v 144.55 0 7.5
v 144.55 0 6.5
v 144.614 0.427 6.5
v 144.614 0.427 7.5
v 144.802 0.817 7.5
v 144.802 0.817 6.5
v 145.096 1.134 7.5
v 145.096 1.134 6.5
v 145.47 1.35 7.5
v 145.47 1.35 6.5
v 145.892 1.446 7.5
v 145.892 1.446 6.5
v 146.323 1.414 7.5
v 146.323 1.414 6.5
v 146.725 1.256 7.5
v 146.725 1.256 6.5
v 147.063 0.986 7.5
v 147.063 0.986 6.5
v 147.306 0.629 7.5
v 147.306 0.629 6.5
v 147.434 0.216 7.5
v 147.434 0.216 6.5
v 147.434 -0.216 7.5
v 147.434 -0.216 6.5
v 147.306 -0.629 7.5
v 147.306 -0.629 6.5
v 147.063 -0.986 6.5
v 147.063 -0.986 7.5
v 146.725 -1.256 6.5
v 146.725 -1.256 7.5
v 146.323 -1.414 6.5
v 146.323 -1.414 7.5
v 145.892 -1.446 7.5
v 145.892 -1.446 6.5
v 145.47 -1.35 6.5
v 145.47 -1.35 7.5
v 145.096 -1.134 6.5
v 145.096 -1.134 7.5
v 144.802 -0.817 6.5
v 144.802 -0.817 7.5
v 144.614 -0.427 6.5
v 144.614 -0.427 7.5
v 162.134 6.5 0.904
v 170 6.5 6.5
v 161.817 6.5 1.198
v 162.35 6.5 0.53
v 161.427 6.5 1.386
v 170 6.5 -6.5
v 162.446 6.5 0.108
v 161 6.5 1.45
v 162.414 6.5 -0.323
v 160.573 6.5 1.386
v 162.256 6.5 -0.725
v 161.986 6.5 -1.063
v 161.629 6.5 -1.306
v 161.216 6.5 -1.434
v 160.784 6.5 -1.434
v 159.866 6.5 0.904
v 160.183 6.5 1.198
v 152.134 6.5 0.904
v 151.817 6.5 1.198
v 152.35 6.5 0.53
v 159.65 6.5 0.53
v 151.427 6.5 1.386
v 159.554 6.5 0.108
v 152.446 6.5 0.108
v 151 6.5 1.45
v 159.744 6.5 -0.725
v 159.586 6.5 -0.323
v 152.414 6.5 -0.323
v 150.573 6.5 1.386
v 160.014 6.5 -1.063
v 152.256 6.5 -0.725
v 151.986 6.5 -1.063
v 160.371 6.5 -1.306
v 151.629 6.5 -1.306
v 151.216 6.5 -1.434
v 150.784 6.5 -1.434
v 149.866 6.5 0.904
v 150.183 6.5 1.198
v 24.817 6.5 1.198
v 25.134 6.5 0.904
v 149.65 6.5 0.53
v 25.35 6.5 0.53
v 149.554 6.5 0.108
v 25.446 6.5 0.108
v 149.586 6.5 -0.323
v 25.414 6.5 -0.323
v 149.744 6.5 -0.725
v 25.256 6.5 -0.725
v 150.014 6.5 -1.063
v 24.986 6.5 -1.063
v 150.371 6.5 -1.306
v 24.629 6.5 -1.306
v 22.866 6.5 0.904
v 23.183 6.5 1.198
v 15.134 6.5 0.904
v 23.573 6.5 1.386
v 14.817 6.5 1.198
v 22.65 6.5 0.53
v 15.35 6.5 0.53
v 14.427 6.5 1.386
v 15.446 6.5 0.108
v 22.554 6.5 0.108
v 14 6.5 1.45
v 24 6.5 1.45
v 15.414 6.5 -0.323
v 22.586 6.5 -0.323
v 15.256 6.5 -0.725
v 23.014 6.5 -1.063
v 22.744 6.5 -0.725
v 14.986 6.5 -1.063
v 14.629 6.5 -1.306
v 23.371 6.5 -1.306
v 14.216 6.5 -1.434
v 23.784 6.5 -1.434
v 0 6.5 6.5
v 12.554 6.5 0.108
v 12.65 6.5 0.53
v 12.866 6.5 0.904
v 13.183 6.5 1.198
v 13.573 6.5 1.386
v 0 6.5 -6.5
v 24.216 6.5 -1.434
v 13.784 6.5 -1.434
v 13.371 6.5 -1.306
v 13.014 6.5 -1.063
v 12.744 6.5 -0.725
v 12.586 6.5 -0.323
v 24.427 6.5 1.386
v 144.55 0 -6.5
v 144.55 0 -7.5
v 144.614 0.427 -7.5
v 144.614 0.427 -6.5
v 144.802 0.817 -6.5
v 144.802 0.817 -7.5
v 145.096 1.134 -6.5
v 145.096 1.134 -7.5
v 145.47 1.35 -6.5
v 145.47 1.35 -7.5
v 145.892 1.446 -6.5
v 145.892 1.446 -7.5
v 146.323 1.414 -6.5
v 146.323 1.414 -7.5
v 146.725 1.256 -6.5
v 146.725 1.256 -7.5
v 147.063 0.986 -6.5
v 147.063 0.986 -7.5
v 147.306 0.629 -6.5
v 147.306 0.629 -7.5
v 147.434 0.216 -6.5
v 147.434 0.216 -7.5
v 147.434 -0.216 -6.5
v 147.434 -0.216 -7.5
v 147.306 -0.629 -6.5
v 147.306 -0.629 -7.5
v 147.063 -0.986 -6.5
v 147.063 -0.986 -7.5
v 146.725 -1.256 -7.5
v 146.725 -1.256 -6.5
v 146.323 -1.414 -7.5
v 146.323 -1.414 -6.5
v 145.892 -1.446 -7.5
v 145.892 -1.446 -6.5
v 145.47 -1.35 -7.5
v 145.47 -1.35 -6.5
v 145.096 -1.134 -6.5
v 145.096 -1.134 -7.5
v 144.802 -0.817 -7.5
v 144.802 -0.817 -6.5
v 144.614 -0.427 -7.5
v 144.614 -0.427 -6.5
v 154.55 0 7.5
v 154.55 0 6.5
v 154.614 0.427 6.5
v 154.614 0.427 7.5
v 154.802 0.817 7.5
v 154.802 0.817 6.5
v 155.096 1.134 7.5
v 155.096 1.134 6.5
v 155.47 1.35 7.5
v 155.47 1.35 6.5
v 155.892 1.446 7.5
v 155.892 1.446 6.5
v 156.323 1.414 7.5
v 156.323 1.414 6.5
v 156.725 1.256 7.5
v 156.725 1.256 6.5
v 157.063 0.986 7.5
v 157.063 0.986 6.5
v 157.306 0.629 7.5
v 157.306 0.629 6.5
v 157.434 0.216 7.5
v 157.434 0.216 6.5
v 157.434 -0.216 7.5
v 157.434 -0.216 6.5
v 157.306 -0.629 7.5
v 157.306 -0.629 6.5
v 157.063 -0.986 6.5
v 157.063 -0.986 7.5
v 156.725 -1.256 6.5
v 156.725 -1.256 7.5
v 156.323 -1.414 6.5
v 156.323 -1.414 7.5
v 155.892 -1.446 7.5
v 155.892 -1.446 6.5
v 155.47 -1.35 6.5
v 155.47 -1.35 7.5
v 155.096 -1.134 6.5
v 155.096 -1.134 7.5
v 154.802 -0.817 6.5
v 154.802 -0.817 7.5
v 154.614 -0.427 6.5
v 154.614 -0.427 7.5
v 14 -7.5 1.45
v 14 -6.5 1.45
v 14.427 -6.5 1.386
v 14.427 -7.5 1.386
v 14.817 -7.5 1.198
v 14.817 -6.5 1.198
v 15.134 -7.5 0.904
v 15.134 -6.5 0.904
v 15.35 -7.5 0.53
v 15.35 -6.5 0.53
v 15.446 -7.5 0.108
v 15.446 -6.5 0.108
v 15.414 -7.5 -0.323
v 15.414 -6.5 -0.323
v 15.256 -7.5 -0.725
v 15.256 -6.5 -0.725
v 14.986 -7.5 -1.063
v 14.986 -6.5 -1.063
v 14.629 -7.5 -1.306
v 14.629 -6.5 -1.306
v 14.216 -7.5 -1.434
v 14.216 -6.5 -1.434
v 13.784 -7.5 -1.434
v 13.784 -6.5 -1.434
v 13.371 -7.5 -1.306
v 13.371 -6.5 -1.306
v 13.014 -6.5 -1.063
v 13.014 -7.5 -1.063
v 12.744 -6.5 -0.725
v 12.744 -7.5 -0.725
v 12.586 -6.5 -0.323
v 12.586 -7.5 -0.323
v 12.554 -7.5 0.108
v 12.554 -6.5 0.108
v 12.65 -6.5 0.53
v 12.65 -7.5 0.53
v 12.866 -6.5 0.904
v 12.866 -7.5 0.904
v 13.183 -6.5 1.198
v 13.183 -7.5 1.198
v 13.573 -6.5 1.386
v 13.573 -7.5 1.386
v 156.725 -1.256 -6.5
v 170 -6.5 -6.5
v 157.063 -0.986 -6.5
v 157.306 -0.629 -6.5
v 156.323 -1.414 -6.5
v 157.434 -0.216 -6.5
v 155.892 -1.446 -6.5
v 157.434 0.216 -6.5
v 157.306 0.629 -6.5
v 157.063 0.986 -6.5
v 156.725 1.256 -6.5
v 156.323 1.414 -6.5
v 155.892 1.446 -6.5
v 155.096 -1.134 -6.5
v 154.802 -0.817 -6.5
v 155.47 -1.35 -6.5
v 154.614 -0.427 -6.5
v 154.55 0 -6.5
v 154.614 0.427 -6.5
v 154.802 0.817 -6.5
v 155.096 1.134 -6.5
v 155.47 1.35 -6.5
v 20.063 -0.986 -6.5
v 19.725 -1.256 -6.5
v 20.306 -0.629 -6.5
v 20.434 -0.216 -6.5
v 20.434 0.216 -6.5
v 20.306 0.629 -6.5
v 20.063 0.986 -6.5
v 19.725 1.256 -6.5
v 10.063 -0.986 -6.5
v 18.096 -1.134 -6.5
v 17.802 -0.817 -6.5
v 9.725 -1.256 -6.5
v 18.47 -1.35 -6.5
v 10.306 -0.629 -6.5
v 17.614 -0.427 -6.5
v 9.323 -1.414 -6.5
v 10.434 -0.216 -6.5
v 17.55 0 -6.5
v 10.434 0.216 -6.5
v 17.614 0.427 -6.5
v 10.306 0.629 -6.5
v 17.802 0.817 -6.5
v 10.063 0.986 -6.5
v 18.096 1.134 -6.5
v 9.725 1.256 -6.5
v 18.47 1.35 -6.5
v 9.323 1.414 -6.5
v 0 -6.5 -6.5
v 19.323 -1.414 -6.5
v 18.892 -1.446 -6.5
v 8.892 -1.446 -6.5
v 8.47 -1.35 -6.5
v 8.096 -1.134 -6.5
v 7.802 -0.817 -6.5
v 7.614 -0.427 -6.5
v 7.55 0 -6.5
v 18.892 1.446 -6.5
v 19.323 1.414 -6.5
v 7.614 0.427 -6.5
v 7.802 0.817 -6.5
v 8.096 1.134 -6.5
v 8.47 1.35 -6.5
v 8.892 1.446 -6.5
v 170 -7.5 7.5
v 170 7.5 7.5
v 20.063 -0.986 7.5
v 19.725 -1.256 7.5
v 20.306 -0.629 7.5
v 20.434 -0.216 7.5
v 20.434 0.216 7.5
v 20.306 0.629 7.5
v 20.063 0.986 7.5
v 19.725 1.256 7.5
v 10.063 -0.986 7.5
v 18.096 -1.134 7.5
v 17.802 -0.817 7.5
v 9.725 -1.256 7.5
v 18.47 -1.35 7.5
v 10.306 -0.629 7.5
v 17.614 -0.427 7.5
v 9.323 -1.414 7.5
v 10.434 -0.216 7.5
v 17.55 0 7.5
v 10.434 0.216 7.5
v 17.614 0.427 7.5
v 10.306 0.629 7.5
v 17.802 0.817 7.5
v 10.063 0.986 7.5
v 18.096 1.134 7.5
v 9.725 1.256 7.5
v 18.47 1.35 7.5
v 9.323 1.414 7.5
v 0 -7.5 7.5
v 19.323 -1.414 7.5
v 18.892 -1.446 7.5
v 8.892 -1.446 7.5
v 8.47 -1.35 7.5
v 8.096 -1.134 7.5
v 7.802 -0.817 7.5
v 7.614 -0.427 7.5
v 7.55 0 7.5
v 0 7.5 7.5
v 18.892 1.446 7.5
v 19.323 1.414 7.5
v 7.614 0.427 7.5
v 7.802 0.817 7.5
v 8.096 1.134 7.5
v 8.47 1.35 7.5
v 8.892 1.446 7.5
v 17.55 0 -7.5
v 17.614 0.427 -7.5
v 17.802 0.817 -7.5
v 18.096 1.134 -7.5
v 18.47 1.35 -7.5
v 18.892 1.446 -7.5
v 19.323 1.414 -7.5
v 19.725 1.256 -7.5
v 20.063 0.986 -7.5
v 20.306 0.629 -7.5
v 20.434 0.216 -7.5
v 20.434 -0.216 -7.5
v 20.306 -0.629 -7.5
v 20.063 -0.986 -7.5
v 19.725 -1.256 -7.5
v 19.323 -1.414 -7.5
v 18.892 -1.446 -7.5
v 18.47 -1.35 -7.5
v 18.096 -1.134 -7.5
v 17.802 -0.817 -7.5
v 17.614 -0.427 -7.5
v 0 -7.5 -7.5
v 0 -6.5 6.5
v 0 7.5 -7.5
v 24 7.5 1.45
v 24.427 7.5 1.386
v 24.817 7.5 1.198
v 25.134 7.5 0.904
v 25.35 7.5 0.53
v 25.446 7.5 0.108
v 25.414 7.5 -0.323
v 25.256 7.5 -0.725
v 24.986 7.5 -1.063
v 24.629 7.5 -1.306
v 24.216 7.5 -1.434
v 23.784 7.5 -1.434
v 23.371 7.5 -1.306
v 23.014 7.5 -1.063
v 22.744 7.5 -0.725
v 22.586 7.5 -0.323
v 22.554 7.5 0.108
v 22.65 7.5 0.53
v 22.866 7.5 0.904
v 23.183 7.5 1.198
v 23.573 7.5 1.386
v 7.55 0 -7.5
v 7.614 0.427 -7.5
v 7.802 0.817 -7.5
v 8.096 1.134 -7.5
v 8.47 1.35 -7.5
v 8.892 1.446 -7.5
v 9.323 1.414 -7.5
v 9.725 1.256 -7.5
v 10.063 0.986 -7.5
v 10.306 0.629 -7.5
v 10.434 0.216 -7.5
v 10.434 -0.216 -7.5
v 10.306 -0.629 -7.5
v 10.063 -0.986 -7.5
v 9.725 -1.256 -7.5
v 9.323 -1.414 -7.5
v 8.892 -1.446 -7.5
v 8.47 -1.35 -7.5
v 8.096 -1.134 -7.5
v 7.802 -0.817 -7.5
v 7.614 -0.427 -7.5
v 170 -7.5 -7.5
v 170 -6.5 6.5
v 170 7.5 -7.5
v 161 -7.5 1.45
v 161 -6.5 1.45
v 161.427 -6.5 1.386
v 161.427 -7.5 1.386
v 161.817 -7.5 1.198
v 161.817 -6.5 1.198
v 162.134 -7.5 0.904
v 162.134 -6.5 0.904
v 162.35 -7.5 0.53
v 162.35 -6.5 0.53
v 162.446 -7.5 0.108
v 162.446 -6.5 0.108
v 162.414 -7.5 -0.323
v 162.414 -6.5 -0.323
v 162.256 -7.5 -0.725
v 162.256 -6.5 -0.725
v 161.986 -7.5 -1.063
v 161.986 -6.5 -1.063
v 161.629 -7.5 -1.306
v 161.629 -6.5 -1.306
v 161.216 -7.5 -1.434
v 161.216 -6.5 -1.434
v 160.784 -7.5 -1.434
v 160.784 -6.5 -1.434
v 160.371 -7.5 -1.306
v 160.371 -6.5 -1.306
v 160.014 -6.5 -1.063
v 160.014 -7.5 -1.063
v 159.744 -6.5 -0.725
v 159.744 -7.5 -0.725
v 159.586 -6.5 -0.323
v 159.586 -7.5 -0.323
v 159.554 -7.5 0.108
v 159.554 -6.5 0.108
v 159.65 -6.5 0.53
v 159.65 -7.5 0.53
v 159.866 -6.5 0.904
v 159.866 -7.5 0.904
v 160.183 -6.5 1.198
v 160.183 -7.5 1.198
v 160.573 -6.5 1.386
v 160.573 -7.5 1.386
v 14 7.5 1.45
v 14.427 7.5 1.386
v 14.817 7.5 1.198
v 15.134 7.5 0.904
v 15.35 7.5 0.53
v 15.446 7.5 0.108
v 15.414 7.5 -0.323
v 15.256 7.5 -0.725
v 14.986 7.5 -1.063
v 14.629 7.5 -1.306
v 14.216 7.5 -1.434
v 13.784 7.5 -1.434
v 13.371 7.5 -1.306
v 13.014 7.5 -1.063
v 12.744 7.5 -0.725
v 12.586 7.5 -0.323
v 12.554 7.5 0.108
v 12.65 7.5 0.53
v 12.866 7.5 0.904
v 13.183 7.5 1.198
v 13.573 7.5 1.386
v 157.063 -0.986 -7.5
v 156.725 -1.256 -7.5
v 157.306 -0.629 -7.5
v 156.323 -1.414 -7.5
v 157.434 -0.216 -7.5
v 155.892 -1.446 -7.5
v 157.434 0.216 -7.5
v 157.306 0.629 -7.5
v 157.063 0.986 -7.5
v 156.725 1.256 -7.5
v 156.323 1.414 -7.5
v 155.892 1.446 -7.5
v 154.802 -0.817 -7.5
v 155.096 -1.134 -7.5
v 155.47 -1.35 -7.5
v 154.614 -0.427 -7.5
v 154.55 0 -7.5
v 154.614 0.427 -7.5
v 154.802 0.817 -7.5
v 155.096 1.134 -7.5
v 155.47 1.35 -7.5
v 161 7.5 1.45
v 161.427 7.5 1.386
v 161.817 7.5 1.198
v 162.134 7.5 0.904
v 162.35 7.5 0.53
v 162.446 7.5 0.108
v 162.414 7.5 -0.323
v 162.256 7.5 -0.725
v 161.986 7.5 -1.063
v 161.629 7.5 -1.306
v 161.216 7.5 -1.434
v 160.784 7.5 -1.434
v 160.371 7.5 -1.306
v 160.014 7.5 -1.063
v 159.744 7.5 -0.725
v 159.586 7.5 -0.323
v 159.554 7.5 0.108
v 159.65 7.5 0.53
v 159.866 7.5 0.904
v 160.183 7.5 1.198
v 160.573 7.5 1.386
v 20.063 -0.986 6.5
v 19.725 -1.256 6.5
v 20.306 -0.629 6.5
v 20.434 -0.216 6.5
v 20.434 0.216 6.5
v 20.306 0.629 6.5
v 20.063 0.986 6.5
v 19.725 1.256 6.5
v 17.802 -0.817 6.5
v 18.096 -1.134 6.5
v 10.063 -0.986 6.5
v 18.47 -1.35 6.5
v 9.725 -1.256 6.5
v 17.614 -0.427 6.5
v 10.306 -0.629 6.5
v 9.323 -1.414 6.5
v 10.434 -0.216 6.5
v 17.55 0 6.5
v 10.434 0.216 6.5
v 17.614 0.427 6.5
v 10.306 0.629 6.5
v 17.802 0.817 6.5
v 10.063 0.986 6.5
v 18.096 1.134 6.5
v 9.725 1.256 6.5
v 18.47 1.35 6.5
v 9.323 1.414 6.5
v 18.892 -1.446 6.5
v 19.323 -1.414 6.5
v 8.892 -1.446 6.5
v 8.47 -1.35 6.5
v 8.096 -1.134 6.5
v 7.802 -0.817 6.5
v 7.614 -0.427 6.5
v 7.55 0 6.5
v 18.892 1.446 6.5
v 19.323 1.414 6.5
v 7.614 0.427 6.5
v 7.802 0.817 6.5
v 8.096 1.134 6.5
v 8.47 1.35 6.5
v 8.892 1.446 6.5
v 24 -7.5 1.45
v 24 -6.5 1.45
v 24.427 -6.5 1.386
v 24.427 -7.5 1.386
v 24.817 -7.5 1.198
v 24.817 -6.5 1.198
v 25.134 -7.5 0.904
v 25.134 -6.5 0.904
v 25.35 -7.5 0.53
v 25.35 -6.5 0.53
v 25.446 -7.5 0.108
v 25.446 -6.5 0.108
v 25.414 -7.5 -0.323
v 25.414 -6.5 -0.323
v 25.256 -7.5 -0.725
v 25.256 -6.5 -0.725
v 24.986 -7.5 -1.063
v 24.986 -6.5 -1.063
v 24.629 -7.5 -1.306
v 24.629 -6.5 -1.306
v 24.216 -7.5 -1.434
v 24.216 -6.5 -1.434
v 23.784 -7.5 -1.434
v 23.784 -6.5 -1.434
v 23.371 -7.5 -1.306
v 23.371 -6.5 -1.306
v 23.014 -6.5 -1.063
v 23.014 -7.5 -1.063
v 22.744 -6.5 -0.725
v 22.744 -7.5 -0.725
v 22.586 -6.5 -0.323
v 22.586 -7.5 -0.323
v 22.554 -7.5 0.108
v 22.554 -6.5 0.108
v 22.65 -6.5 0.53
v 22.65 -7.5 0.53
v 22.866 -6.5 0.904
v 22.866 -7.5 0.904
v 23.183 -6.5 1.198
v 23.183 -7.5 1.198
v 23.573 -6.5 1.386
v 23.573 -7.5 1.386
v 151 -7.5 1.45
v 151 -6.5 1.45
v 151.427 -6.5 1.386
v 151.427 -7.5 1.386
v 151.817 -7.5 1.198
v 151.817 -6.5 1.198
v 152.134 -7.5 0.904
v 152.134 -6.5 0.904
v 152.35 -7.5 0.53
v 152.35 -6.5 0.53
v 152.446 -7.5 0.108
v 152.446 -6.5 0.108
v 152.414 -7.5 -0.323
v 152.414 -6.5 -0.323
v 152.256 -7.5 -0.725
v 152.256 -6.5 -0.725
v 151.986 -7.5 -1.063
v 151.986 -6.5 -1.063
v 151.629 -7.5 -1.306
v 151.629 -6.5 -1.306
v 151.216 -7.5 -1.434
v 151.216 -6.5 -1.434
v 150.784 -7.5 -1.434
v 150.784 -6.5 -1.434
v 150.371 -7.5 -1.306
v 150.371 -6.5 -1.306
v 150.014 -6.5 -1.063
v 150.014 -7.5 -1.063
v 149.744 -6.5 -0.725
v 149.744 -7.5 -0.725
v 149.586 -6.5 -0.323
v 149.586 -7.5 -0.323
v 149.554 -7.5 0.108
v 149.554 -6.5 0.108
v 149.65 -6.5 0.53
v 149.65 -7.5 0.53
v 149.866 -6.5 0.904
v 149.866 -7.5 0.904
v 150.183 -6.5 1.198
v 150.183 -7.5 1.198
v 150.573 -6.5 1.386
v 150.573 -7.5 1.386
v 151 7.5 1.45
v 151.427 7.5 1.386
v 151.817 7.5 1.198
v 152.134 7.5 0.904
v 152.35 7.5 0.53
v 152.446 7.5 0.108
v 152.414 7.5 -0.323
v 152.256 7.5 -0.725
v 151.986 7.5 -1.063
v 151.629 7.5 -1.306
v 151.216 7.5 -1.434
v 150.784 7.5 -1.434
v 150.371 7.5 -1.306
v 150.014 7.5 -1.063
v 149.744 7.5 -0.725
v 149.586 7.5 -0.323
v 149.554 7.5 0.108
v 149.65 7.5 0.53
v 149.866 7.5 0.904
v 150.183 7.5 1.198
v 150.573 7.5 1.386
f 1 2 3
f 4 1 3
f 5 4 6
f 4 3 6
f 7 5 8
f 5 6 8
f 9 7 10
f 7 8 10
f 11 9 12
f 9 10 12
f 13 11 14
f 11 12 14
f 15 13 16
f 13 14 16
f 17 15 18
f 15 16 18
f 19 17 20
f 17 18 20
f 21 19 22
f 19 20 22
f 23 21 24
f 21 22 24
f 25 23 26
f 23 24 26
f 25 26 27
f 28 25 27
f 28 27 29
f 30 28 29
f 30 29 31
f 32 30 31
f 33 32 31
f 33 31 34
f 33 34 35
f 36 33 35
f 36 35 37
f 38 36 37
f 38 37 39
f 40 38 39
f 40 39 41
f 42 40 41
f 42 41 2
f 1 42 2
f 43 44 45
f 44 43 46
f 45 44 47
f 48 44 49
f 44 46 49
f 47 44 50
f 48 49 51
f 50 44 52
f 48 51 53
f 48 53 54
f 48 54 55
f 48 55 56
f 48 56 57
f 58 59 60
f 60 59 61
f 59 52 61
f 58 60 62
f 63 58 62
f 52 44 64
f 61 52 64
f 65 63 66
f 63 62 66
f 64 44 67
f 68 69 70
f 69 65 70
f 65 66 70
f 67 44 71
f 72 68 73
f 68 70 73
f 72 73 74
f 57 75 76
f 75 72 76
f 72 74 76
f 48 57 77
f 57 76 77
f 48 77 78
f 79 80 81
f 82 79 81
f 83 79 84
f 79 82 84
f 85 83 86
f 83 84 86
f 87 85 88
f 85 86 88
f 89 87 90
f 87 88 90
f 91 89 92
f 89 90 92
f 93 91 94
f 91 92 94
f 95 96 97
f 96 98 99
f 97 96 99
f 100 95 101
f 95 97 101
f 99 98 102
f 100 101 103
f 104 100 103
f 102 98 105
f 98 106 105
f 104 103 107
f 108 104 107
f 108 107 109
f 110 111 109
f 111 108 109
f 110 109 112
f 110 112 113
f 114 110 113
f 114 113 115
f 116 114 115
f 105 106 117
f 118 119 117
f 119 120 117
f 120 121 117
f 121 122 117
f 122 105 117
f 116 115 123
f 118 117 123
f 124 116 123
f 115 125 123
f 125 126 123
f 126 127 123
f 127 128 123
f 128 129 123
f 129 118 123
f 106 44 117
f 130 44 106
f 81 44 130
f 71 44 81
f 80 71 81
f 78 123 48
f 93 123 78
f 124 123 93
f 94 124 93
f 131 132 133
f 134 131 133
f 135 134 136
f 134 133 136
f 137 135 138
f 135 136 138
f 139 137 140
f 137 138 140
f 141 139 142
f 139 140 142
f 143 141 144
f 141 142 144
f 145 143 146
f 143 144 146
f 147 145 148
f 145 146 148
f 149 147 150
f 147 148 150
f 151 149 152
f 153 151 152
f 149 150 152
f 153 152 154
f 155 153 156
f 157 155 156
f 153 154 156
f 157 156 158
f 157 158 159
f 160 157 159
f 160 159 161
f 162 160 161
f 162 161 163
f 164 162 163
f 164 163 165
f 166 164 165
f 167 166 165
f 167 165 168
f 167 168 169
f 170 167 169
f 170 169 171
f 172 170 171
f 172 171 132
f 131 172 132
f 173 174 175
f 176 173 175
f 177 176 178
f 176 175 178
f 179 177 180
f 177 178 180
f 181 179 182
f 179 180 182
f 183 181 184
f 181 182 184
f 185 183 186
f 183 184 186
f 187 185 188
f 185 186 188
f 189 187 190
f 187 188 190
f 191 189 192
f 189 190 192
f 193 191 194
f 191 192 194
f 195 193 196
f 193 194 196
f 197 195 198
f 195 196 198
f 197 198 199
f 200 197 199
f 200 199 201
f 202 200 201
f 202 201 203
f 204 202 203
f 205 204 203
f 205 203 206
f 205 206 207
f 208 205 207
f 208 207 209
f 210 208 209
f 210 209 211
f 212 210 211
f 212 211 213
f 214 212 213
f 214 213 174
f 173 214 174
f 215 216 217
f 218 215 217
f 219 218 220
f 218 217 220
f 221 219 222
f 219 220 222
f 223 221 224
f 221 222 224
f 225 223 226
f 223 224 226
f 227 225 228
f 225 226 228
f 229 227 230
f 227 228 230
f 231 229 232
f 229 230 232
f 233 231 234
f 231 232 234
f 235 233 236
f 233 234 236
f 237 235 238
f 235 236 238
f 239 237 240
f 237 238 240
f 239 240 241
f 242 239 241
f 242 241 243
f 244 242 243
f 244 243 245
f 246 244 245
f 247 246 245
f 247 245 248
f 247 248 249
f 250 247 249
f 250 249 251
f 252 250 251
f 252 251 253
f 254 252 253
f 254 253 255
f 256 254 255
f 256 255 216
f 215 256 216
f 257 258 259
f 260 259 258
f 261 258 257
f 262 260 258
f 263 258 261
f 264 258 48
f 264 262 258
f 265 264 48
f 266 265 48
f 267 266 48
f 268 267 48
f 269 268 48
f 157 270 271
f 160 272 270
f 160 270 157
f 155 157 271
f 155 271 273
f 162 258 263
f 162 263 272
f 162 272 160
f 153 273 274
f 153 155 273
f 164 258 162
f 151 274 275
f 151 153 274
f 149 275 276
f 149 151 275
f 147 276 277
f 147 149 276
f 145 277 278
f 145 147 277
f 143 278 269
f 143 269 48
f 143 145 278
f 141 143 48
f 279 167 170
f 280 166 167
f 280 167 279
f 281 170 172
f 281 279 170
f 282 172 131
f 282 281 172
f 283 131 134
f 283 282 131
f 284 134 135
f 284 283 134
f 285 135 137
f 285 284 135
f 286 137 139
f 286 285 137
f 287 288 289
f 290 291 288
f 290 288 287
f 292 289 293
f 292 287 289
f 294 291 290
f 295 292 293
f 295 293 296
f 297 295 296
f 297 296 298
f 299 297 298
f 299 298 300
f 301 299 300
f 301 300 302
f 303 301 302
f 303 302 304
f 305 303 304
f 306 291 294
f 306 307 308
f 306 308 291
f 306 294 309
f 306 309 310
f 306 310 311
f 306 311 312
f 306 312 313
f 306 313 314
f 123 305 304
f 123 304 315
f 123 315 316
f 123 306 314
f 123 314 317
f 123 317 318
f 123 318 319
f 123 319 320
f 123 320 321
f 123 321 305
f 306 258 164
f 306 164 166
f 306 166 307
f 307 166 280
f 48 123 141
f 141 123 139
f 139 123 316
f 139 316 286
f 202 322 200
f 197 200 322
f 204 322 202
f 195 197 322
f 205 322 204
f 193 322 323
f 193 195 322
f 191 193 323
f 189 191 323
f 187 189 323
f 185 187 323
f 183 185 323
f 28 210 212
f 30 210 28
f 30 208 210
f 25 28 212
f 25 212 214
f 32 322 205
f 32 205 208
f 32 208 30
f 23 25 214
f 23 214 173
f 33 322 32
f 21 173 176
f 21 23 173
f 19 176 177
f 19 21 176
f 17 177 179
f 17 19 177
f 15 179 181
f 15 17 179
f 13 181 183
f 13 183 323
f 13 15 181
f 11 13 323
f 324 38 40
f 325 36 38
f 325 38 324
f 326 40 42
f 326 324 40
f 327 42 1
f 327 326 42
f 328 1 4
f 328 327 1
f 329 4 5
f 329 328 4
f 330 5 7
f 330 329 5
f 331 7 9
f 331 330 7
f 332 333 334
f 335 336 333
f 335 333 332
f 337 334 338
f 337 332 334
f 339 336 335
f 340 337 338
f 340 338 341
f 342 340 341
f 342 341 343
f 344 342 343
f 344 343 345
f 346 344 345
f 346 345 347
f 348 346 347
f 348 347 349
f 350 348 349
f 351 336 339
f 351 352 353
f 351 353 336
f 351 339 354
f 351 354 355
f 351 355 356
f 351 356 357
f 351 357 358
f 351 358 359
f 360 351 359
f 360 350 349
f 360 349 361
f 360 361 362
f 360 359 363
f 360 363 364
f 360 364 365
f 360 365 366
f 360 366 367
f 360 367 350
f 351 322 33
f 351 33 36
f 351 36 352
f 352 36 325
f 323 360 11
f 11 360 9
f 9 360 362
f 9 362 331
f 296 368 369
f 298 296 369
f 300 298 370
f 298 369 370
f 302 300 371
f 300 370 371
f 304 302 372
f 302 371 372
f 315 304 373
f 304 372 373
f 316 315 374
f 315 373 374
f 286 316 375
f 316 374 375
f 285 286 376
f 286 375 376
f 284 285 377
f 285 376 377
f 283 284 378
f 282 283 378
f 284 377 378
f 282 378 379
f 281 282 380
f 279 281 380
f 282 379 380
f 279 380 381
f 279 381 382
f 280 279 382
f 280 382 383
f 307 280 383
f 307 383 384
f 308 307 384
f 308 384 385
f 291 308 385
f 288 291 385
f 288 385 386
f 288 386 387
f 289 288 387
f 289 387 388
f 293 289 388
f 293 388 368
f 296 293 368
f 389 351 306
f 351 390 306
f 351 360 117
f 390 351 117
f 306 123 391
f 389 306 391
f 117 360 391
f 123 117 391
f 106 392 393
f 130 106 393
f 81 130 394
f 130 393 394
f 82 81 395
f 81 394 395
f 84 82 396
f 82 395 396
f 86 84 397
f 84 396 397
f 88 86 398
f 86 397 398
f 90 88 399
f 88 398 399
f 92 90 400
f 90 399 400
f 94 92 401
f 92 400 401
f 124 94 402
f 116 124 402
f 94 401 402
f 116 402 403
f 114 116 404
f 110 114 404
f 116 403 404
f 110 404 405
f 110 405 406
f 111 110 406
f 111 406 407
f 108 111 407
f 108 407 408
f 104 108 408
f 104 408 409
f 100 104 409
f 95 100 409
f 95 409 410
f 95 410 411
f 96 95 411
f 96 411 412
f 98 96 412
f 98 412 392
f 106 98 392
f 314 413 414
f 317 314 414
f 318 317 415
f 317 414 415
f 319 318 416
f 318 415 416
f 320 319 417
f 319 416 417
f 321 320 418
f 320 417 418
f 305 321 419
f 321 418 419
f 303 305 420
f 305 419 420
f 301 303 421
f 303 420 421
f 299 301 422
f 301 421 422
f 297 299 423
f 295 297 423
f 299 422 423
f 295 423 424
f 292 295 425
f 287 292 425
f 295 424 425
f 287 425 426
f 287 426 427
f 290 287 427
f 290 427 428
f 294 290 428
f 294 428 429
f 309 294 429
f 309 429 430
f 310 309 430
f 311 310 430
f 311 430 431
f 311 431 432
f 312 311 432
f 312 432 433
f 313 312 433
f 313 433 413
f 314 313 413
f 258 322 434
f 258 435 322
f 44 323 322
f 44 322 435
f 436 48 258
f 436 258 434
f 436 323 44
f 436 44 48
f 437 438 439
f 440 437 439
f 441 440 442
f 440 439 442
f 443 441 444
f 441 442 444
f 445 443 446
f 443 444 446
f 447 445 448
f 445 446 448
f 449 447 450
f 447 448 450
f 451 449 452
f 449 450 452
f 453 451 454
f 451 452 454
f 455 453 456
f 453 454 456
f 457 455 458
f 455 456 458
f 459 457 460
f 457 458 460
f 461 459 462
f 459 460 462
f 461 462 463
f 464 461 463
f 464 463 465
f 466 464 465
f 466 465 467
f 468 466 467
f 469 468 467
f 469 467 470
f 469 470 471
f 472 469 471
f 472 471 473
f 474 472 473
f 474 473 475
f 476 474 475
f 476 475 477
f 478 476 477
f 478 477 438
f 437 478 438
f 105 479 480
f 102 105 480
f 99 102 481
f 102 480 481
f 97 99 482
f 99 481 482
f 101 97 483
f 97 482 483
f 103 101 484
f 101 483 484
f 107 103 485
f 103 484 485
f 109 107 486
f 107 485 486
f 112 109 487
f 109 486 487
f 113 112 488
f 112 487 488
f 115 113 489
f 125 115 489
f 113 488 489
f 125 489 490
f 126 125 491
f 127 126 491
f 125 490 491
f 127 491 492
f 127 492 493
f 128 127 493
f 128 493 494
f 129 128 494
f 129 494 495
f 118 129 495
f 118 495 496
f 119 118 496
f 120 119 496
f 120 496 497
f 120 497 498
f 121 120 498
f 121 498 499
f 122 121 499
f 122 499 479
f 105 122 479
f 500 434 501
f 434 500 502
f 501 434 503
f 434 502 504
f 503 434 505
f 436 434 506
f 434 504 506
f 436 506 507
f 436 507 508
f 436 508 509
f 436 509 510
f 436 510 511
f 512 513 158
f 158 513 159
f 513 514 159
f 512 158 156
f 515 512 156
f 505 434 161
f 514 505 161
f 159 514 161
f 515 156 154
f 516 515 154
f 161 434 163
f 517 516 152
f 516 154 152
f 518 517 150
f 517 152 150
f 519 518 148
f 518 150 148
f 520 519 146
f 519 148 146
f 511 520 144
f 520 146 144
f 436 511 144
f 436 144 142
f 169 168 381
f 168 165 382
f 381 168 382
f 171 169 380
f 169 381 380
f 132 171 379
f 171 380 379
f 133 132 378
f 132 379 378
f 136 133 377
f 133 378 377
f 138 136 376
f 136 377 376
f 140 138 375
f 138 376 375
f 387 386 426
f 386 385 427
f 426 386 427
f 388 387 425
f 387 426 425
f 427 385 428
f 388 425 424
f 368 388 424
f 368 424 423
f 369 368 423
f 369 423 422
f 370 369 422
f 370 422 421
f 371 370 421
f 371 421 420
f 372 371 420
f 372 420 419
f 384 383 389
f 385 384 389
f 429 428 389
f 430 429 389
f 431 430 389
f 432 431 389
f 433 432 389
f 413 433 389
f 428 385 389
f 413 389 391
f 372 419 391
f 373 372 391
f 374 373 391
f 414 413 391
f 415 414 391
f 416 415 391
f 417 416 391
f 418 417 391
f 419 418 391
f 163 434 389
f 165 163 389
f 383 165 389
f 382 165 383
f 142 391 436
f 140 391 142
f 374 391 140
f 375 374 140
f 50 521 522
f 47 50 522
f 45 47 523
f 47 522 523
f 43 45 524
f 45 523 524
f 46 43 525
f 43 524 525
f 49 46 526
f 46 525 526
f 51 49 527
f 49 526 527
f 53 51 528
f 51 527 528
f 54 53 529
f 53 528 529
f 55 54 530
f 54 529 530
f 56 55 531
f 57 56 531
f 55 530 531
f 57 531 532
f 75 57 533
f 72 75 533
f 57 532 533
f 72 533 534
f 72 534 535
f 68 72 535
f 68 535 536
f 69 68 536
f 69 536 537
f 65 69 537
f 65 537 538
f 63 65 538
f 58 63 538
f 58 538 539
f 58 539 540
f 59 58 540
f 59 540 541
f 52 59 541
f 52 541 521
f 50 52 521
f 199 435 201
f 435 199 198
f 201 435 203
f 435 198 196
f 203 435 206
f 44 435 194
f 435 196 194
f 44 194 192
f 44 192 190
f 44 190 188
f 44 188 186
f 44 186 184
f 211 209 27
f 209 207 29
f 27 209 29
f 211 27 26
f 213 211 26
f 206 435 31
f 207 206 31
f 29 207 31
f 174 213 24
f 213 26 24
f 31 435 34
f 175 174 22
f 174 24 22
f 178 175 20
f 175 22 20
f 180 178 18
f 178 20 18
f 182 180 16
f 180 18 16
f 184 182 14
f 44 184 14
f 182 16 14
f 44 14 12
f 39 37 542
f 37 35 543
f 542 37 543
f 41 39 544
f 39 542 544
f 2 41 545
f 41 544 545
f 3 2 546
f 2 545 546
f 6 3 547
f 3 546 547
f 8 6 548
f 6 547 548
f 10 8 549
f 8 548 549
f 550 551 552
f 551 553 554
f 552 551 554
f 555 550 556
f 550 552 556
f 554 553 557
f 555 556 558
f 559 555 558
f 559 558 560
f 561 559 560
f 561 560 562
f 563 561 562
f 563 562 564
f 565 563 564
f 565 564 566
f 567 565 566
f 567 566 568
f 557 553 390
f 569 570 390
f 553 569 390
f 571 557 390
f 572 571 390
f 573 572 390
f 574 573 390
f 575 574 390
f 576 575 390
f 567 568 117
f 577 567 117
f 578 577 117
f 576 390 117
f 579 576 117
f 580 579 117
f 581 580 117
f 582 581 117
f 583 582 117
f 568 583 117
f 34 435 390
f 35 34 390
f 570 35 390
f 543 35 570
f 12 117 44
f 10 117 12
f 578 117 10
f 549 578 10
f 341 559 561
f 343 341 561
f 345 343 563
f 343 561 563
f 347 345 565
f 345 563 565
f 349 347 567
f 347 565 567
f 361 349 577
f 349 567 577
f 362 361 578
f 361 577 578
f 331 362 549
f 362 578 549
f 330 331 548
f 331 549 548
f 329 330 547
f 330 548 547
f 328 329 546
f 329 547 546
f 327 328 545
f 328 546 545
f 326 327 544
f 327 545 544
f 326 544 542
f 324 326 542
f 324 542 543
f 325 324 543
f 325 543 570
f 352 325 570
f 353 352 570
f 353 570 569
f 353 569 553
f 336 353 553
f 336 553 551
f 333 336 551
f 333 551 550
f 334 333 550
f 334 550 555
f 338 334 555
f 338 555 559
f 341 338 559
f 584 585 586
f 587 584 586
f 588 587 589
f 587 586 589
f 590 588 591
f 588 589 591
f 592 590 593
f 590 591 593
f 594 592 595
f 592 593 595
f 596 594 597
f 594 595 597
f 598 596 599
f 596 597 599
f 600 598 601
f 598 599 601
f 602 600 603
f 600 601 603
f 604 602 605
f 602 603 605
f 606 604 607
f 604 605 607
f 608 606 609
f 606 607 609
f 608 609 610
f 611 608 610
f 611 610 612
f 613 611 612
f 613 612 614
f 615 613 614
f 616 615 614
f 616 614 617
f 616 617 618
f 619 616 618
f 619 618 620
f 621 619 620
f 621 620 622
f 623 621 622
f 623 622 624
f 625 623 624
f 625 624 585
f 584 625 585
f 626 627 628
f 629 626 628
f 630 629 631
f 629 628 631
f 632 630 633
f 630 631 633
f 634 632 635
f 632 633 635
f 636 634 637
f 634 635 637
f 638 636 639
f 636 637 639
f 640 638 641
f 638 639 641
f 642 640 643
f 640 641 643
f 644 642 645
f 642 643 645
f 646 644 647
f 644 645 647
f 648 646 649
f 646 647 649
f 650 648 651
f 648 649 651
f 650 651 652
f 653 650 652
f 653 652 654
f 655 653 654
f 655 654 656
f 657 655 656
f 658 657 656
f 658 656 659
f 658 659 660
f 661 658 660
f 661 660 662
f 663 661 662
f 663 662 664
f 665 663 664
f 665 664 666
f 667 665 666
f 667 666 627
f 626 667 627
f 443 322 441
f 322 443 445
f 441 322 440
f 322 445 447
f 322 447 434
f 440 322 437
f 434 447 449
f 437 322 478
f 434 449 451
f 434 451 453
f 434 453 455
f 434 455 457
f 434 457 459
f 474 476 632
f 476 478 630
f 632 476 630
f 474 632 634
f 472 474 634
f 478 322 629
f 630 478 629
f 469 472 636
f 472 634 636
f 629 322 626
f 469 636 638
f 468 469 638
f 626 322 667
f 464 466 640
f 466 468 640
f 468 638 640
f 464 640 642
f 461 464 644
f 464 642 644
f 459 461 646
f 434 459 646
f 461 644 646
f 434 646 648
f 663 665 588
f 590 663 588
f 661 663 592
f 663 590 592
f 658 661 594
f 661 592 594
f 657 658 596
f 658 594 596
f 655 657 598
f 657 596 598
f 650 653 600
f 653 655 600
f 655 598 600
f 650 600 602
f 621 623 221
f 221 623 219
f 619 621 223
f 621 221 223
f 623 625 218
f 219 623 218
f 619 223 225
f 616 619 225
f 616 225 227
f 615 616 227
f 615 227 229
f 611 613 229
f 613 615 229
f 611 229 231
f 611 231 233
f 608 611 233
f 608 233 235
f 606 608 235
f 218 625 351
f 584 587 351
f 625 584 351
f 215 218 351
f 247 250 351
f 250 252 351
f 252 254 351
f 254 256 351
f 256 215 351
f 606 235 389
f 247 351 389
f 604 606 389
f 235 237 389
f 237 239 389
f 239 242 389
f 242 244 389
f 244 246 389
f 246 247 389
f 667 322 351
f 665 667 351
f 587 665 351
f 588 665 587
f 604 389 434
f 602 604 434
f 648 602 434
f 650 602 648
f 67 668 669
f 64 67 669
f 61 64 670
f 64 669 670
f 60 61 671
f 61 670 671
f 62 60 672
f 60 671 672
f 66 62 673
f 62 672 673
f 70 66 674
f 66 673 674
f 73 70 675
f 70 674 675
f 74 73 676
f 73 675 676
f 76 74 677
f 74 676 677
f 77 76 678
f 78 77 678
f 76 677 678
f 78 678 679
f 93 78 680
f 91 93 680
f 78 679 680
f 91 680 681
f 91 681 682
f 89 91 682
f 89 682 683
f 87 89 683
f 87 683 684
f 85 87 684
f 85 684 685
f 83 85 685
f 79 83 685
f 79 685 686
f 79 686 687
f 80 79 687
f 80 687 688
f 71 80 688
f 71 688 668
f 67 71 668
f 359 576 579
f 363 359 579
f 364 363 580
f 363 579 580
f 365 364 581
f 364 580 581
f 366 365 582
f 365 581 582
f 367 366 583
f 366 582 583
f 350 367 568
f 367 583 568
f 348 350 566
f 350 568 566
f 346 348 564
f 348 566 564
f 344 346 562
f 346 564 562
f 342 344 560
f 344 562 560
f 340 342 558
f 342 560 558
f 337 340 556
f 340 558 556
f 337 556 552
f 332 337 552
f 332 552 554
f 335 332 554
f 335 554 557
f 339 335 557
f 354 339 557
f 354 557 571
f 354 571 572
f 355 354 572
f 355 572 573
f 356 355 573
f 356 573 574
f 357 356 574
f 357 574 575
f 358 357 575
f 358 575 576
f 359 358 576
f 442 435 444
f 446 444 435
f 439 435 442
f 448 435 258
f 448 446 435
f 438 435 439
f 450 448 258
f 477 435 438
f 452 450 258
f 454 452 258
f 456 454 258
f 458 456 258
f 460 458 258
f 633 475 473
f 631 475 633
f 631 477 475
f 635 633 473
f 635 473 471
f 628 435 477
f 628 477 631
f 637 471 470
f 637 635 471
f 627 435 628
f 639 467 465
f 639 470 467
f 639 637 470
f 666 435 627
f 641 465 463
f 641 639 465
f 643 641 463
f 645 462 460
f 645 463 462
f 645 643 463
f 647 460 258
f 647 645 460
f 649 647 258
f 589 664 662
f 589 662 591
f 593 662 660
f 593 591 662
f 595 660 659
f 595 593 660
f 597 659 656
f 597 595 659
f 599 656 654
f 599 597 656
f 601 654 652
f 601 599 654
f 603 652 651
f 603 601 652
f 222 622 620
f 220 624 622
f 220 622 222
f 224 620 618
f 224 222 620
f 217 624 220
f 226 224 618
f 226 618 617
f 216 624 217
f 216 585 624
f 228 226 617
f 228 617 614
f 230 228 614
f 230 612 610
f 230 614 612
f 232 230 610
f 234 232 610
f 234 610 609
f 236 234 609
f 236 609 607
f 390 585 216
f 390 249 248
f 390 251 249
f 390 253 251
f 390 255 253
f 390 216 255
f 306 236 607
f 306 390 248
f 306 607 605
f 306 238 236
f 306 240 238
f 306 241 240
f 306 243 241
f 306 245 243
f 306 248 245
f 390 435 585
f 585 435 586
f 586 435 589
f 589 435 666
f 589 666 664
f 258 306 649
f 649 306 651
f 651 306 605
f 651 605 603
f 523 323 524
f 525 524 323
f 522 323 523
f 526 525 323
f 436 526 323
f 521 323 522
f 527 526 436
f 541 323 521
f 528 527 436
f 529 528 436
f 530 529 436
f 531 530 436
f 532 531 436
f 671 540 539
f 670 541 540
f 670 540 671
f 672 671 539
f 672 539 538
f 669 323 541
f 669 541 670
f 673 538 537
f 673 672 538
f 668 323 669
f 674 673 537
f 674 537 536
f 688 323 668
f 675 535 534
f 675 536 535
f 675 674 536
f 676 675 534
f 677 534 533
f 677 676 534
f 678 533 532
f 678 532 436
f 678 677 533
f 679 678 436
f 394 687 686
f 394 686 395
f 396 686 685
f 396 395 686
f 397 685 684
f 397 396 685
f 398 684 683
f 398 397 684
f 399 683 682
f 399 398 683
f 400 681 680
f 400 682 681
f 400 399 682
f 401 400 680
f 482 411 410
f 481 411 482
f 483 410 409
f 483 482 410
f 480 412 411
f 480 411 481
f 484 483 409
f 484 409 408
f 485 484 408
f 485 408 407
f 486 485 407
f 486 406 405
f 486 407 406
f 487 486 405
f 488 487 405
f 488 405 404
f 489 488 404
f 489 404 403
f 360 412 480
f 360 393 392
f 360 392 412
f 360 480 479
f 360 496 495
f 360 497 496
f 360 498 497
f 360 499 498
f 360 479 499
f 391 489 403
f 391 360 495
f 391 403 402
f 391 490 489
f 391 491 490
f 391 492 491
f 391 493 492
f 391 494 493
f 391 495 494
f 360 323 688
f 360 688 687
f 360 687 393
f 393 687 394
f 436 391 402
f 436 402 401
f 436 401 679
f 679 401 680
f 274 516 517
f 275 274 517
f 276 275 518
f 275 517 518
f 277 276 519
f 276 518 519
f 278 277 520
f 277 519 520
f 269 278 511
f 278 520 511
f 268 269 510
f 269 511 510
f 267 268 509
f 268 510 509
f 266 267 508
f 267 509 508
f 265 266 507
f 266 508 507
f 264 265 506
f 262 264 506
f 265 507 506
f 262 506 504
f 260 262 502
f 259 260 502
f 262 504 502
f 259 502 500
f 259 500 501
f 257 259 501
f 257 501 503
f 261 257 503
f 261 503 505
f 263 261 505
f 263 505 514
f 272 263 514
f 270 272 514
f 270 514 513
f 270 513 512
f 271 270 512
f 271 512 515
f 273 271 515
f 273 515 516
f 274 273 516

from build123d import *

# Parameters (mm, degrees)
SKETCH_1_W          = 15
SKETCH_1_H          = 15
SKETCH_1_W_2        = 13
SKETCH_1_H_2        = 13
EXTRUDE_1_DEPTH     = 170
SKETCH_2_R          = 1.45
CUT_EXTRUDE_1_DEPTH = 171.825203059
SKETCH_3_R          = 1.45
CUT_EXTRUDE_2_DEPTH = 171.825203059


with BuildPart() as part:
    # 草图1 → 凸台-拉伸1 (new body)
    with BuildSketch(Plane(origin=(0, 0, 0), x_dir=(0, 0, -1), z_dir=(1, 0, 0))):
        Rectangle(SKETCH_1_W, SKETCH_1_H)
        Rectangle(SKETCH_1_W_2, SKETCH_1_H_2, mode=Mode.SUBTRACT)
    extrude(amount=EXTRUDE_1_DEPTH)

    # 草图2 → 切除-拉伸1 (cut, through all)
    with BuildSketch(Plane(origin=(0, 0, -7.5), x_dir=(-1, 0, 0), z_dir=(0, 0, -1))):
        with Locations((-9, 0)):
            Circle(SKETCH_2_R)
        with Locations((-19, 0)):
            Circle(SKETCH_2_R)
        with Locations((-146, 0)):
            Circle(SKETCH_2_R)
        with Locations((-156, 0)):
            Circle(SKETCH_2_R)
    extrude(amount=-CUT_EXTRUDE_1_DEPTH, mode=Mode.SUBTRACT)

    # 草图3 → 切除-拉伸2 (cut, through all)
    with BuildSketch(Plane(origin=(0, 7.5, 0), x_dir=(1, 0, 0), z_dir=(0, 1, 0))):
        with Locations(Location((161, 0, 0), (0, 0, 270))):
            Circle(SKETCH_3_R)
        with Locations(Location((151, 0, 0), (0, 0, 270))):
            Circle(SKETCH_3_R)
        with Locations(Location((24, 0, 0), (0, 0, 270))):
            Circle(SKETCH_3_R)
        with Locations(Location((14, 0, 0), (0, 0, 270))):
            Circle(SKETCH_3_R)
    extrude(amount=-CUT_EXTRUDE_2_DEPTH, mode=Mode.SUBTRACT)


solid = part.part
